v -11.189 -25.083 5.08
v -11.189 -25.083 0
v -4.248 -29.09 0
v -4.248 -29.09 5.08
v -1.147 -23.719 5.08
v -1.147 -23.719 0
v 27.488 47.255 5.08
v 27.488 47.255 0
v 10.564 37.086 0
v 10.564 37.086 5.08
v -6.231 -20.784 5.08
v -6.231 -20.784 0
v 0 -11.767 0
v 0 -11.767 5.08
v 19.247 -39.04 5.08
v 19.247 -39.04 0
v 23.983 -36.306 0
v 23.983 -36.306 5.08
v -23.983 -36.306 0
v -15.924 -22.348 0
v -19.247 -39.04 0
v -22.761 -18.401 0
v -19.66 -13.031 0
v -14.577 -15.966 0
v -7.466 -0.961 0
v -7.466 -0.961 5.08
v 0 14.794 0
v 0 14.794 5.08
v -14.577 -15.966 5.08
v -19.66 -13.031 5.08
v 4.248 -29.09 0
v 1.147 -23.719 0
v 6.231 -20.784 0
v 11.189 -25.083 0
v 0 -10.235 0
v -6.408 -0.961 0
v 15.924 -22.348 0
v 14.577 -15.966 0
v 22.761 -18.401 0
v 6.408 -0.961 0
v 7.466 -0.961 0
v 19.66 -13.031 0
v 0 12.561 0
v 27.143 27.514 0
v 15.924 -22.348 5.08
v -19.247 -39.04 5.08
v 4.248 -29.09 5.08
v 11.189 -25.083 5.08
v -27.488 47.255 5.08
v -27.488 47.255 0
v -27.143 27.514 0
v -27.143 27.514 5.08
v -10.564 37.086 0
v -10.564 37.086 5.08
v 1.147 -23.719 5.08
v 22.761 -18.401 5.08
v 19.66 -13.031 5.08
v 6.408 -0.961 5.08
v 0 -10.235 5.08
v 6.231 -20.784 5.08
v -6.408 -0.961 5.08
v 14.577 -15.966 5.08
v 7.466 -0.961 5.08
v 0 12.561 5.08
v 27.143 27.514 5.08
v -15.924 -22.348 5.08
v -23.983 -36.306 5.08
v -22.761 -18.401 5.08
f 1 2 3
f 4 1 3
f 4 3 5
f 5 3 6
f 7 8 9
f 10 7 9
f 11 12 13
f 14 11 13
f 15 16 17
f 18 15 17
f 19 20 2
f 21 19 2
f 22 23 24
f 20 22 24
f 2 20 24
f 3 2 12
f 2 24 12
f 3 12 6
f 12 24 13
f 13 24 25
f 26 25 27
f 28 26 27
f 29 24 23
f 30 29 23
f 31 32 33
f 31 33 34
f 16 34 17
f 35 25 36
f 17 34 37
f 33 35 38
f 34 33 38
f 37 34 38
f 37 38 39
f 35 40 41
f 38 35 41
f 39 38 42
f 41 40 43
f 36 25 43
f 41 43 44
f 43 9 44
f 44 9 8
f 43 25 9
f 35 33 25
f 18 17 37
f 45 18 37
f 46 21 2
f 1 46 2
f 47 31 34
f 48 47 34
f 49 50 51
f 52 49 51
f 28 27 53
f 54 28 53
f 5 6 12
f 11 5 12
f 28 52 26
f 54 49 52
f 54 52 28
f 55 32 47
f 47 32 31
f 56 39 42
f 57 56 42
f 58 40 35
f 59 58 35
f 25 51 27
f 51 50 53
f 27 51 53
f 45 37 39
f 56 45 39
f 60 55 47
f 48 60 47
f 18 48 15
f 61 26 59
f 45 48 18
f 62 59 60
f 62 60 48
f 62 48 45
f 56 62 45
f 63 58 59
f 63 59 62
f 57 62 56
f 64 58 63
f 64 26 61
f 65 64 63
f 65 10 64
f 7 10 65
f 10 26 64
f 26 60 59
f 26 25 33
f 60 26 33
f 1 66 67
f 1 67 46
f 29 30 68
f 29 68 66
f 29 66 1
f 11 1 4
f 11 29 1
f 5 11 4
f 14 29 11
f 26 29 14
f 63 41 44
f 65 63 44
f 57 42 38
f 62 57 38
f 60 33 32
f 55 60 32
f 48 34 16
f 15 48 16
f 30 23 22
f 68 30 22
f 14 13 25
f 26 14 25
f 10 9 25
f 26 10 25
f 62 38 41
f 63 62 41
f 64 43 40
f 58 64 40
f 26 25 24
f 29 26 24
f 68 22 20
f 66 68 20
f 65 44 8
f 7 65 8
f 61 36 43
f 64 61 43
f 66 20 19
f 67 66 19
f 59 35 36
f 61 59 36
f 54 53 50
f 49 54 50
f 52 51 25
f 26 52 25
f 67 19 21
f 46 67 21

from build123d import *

# Parameters (mm, degrees)
F1_DEPTH = 5.08
F2_DEPTH = 5.08
F3_DEPTH = 5.08
F4_DEPTH = 5.08
F5_DEPTH = 5.08
F6_DEPTH = 5.08
F7_DEPTH = 5.08
F8_DEPTH = 5.08
F9_DEPTH = 5.08


with BuildPart() as f1:
    # F0 (on Top) → F1 (new body)
    with BuildSketch(Plane.XY):
        Polygon((-27.1429486431, 27.5143728866), (-7.4663818198, -0.961395638), (0, 14.7941357478), (-10.5639939546, 37.0862368388), (-27.4876418162, 47.2551268799), align=None)
    extrude(amount=F1_DEPTH)


with BuildPart() as f2:
    # F0 (on Top) → F2 (new body)
    with BuildSketch(Plane.XY):
        Polygon((-7.4663818198, -0.961395638), (-14.5768045919, -15.965783554), (-6.231049466, -20.7842075226), (0, -11.7666830809), align=None)
    extrude(amount=F2_DEPTH)

    # F0 (on Top) → F7 (join)
    with BuildSketch(Plane.XY):
        Polygon((-19.660384601, -13.0307772673), (-22.7609974951, -18.4011963345), (-15.9242138402, -22.348415218), (-11.1885193949, -25.0825696808), (-4.248082351, -29.0896328764), (-1.1474694569, -23.7192138093), (-6.231049466, -20.7842075226), (-14.5768045919, -15.965783554), align=None)
    extrude(amount=F7_DEPTH)

    # F0 (on Top) → F8 (join)
    with BuildSketch(Plane.XY):
        Polygon((-11.1885193949, -25.0825696808), (-15.9242138402, -22.348415218), (-23.9827748524, -36.3062523269), (-19.2470804071, -39.0404067898), align=None)
    extrude(amount=F8_DEPTH)


with BuildPart() as f3:
    # F0 (on Top) → F3 (new body)
    with BuildSketch(Plane.XY):
        Polygon((0, 14.7941357478), (-7.4663818198, -0.961395638), (0, -11.7666830809), (7.4663818198, -0.961395638), align=None)
        Polygon((-6.4083149498, -0.961395638), (0, 12.5614069402), (6.4083149498, -0.961395638), (0, -10.2354572557), align=None, mode=Mode.SUBTRACT)
    extrude(amount=F3_DEPTH)

    # F0 (on Top) → F4 (join)
    with BuildSketch(Plane.XY):
        Polygon((10.5639939546, 37.0862368388), (0, 14.7941357478), (7.4663818198, -0.961395638), (27.1429486431, 27.5143728866), (27.4876418162, 47.2551268799), align=None)
    extrude(amount=F4_DEPTH)

    # F0 (on Top) → F5 (join)
    with BuildSketch(Plane.XY):
        Polygon((7.4663818198, -0.961395638), (0, -11.7666830809), (6.231049466, -20.7842075226), (14.5768045919, -15.965783554), align=None)
    extrude(amount=F5_DEPTH)

    # F0 (on Top) → F6 (join)
    with BuildSketch(Plane.XY):
        Polygon((14.5768045919, -15.965783554), (6.231049466, -20.7842075226), (1.1474694569, -23.7192138093), (4.248082351, -29.0896328764), (11.1885193949, -25.0825696808), (15.9242138402, -22.348415218), (22.7609974951, -18.4011963345), (19.660384601, -13.0307772673), align=None)
    extrude(amount=F6_DEPTH)

    # F0 (on Top) → F9 (join)
    with BuildSketch(Plane.XY):
        Polygon((15.9242138402, -22.348415218), (11.1885193949, -25.0825696808), (19.2470804071, -39.0404067898), (23.9827748524, -36.3062523269), align=None)
    extrude(amount=F9_DEPTH)


solid = Compound([f1.part, f2.part, f3.part])
